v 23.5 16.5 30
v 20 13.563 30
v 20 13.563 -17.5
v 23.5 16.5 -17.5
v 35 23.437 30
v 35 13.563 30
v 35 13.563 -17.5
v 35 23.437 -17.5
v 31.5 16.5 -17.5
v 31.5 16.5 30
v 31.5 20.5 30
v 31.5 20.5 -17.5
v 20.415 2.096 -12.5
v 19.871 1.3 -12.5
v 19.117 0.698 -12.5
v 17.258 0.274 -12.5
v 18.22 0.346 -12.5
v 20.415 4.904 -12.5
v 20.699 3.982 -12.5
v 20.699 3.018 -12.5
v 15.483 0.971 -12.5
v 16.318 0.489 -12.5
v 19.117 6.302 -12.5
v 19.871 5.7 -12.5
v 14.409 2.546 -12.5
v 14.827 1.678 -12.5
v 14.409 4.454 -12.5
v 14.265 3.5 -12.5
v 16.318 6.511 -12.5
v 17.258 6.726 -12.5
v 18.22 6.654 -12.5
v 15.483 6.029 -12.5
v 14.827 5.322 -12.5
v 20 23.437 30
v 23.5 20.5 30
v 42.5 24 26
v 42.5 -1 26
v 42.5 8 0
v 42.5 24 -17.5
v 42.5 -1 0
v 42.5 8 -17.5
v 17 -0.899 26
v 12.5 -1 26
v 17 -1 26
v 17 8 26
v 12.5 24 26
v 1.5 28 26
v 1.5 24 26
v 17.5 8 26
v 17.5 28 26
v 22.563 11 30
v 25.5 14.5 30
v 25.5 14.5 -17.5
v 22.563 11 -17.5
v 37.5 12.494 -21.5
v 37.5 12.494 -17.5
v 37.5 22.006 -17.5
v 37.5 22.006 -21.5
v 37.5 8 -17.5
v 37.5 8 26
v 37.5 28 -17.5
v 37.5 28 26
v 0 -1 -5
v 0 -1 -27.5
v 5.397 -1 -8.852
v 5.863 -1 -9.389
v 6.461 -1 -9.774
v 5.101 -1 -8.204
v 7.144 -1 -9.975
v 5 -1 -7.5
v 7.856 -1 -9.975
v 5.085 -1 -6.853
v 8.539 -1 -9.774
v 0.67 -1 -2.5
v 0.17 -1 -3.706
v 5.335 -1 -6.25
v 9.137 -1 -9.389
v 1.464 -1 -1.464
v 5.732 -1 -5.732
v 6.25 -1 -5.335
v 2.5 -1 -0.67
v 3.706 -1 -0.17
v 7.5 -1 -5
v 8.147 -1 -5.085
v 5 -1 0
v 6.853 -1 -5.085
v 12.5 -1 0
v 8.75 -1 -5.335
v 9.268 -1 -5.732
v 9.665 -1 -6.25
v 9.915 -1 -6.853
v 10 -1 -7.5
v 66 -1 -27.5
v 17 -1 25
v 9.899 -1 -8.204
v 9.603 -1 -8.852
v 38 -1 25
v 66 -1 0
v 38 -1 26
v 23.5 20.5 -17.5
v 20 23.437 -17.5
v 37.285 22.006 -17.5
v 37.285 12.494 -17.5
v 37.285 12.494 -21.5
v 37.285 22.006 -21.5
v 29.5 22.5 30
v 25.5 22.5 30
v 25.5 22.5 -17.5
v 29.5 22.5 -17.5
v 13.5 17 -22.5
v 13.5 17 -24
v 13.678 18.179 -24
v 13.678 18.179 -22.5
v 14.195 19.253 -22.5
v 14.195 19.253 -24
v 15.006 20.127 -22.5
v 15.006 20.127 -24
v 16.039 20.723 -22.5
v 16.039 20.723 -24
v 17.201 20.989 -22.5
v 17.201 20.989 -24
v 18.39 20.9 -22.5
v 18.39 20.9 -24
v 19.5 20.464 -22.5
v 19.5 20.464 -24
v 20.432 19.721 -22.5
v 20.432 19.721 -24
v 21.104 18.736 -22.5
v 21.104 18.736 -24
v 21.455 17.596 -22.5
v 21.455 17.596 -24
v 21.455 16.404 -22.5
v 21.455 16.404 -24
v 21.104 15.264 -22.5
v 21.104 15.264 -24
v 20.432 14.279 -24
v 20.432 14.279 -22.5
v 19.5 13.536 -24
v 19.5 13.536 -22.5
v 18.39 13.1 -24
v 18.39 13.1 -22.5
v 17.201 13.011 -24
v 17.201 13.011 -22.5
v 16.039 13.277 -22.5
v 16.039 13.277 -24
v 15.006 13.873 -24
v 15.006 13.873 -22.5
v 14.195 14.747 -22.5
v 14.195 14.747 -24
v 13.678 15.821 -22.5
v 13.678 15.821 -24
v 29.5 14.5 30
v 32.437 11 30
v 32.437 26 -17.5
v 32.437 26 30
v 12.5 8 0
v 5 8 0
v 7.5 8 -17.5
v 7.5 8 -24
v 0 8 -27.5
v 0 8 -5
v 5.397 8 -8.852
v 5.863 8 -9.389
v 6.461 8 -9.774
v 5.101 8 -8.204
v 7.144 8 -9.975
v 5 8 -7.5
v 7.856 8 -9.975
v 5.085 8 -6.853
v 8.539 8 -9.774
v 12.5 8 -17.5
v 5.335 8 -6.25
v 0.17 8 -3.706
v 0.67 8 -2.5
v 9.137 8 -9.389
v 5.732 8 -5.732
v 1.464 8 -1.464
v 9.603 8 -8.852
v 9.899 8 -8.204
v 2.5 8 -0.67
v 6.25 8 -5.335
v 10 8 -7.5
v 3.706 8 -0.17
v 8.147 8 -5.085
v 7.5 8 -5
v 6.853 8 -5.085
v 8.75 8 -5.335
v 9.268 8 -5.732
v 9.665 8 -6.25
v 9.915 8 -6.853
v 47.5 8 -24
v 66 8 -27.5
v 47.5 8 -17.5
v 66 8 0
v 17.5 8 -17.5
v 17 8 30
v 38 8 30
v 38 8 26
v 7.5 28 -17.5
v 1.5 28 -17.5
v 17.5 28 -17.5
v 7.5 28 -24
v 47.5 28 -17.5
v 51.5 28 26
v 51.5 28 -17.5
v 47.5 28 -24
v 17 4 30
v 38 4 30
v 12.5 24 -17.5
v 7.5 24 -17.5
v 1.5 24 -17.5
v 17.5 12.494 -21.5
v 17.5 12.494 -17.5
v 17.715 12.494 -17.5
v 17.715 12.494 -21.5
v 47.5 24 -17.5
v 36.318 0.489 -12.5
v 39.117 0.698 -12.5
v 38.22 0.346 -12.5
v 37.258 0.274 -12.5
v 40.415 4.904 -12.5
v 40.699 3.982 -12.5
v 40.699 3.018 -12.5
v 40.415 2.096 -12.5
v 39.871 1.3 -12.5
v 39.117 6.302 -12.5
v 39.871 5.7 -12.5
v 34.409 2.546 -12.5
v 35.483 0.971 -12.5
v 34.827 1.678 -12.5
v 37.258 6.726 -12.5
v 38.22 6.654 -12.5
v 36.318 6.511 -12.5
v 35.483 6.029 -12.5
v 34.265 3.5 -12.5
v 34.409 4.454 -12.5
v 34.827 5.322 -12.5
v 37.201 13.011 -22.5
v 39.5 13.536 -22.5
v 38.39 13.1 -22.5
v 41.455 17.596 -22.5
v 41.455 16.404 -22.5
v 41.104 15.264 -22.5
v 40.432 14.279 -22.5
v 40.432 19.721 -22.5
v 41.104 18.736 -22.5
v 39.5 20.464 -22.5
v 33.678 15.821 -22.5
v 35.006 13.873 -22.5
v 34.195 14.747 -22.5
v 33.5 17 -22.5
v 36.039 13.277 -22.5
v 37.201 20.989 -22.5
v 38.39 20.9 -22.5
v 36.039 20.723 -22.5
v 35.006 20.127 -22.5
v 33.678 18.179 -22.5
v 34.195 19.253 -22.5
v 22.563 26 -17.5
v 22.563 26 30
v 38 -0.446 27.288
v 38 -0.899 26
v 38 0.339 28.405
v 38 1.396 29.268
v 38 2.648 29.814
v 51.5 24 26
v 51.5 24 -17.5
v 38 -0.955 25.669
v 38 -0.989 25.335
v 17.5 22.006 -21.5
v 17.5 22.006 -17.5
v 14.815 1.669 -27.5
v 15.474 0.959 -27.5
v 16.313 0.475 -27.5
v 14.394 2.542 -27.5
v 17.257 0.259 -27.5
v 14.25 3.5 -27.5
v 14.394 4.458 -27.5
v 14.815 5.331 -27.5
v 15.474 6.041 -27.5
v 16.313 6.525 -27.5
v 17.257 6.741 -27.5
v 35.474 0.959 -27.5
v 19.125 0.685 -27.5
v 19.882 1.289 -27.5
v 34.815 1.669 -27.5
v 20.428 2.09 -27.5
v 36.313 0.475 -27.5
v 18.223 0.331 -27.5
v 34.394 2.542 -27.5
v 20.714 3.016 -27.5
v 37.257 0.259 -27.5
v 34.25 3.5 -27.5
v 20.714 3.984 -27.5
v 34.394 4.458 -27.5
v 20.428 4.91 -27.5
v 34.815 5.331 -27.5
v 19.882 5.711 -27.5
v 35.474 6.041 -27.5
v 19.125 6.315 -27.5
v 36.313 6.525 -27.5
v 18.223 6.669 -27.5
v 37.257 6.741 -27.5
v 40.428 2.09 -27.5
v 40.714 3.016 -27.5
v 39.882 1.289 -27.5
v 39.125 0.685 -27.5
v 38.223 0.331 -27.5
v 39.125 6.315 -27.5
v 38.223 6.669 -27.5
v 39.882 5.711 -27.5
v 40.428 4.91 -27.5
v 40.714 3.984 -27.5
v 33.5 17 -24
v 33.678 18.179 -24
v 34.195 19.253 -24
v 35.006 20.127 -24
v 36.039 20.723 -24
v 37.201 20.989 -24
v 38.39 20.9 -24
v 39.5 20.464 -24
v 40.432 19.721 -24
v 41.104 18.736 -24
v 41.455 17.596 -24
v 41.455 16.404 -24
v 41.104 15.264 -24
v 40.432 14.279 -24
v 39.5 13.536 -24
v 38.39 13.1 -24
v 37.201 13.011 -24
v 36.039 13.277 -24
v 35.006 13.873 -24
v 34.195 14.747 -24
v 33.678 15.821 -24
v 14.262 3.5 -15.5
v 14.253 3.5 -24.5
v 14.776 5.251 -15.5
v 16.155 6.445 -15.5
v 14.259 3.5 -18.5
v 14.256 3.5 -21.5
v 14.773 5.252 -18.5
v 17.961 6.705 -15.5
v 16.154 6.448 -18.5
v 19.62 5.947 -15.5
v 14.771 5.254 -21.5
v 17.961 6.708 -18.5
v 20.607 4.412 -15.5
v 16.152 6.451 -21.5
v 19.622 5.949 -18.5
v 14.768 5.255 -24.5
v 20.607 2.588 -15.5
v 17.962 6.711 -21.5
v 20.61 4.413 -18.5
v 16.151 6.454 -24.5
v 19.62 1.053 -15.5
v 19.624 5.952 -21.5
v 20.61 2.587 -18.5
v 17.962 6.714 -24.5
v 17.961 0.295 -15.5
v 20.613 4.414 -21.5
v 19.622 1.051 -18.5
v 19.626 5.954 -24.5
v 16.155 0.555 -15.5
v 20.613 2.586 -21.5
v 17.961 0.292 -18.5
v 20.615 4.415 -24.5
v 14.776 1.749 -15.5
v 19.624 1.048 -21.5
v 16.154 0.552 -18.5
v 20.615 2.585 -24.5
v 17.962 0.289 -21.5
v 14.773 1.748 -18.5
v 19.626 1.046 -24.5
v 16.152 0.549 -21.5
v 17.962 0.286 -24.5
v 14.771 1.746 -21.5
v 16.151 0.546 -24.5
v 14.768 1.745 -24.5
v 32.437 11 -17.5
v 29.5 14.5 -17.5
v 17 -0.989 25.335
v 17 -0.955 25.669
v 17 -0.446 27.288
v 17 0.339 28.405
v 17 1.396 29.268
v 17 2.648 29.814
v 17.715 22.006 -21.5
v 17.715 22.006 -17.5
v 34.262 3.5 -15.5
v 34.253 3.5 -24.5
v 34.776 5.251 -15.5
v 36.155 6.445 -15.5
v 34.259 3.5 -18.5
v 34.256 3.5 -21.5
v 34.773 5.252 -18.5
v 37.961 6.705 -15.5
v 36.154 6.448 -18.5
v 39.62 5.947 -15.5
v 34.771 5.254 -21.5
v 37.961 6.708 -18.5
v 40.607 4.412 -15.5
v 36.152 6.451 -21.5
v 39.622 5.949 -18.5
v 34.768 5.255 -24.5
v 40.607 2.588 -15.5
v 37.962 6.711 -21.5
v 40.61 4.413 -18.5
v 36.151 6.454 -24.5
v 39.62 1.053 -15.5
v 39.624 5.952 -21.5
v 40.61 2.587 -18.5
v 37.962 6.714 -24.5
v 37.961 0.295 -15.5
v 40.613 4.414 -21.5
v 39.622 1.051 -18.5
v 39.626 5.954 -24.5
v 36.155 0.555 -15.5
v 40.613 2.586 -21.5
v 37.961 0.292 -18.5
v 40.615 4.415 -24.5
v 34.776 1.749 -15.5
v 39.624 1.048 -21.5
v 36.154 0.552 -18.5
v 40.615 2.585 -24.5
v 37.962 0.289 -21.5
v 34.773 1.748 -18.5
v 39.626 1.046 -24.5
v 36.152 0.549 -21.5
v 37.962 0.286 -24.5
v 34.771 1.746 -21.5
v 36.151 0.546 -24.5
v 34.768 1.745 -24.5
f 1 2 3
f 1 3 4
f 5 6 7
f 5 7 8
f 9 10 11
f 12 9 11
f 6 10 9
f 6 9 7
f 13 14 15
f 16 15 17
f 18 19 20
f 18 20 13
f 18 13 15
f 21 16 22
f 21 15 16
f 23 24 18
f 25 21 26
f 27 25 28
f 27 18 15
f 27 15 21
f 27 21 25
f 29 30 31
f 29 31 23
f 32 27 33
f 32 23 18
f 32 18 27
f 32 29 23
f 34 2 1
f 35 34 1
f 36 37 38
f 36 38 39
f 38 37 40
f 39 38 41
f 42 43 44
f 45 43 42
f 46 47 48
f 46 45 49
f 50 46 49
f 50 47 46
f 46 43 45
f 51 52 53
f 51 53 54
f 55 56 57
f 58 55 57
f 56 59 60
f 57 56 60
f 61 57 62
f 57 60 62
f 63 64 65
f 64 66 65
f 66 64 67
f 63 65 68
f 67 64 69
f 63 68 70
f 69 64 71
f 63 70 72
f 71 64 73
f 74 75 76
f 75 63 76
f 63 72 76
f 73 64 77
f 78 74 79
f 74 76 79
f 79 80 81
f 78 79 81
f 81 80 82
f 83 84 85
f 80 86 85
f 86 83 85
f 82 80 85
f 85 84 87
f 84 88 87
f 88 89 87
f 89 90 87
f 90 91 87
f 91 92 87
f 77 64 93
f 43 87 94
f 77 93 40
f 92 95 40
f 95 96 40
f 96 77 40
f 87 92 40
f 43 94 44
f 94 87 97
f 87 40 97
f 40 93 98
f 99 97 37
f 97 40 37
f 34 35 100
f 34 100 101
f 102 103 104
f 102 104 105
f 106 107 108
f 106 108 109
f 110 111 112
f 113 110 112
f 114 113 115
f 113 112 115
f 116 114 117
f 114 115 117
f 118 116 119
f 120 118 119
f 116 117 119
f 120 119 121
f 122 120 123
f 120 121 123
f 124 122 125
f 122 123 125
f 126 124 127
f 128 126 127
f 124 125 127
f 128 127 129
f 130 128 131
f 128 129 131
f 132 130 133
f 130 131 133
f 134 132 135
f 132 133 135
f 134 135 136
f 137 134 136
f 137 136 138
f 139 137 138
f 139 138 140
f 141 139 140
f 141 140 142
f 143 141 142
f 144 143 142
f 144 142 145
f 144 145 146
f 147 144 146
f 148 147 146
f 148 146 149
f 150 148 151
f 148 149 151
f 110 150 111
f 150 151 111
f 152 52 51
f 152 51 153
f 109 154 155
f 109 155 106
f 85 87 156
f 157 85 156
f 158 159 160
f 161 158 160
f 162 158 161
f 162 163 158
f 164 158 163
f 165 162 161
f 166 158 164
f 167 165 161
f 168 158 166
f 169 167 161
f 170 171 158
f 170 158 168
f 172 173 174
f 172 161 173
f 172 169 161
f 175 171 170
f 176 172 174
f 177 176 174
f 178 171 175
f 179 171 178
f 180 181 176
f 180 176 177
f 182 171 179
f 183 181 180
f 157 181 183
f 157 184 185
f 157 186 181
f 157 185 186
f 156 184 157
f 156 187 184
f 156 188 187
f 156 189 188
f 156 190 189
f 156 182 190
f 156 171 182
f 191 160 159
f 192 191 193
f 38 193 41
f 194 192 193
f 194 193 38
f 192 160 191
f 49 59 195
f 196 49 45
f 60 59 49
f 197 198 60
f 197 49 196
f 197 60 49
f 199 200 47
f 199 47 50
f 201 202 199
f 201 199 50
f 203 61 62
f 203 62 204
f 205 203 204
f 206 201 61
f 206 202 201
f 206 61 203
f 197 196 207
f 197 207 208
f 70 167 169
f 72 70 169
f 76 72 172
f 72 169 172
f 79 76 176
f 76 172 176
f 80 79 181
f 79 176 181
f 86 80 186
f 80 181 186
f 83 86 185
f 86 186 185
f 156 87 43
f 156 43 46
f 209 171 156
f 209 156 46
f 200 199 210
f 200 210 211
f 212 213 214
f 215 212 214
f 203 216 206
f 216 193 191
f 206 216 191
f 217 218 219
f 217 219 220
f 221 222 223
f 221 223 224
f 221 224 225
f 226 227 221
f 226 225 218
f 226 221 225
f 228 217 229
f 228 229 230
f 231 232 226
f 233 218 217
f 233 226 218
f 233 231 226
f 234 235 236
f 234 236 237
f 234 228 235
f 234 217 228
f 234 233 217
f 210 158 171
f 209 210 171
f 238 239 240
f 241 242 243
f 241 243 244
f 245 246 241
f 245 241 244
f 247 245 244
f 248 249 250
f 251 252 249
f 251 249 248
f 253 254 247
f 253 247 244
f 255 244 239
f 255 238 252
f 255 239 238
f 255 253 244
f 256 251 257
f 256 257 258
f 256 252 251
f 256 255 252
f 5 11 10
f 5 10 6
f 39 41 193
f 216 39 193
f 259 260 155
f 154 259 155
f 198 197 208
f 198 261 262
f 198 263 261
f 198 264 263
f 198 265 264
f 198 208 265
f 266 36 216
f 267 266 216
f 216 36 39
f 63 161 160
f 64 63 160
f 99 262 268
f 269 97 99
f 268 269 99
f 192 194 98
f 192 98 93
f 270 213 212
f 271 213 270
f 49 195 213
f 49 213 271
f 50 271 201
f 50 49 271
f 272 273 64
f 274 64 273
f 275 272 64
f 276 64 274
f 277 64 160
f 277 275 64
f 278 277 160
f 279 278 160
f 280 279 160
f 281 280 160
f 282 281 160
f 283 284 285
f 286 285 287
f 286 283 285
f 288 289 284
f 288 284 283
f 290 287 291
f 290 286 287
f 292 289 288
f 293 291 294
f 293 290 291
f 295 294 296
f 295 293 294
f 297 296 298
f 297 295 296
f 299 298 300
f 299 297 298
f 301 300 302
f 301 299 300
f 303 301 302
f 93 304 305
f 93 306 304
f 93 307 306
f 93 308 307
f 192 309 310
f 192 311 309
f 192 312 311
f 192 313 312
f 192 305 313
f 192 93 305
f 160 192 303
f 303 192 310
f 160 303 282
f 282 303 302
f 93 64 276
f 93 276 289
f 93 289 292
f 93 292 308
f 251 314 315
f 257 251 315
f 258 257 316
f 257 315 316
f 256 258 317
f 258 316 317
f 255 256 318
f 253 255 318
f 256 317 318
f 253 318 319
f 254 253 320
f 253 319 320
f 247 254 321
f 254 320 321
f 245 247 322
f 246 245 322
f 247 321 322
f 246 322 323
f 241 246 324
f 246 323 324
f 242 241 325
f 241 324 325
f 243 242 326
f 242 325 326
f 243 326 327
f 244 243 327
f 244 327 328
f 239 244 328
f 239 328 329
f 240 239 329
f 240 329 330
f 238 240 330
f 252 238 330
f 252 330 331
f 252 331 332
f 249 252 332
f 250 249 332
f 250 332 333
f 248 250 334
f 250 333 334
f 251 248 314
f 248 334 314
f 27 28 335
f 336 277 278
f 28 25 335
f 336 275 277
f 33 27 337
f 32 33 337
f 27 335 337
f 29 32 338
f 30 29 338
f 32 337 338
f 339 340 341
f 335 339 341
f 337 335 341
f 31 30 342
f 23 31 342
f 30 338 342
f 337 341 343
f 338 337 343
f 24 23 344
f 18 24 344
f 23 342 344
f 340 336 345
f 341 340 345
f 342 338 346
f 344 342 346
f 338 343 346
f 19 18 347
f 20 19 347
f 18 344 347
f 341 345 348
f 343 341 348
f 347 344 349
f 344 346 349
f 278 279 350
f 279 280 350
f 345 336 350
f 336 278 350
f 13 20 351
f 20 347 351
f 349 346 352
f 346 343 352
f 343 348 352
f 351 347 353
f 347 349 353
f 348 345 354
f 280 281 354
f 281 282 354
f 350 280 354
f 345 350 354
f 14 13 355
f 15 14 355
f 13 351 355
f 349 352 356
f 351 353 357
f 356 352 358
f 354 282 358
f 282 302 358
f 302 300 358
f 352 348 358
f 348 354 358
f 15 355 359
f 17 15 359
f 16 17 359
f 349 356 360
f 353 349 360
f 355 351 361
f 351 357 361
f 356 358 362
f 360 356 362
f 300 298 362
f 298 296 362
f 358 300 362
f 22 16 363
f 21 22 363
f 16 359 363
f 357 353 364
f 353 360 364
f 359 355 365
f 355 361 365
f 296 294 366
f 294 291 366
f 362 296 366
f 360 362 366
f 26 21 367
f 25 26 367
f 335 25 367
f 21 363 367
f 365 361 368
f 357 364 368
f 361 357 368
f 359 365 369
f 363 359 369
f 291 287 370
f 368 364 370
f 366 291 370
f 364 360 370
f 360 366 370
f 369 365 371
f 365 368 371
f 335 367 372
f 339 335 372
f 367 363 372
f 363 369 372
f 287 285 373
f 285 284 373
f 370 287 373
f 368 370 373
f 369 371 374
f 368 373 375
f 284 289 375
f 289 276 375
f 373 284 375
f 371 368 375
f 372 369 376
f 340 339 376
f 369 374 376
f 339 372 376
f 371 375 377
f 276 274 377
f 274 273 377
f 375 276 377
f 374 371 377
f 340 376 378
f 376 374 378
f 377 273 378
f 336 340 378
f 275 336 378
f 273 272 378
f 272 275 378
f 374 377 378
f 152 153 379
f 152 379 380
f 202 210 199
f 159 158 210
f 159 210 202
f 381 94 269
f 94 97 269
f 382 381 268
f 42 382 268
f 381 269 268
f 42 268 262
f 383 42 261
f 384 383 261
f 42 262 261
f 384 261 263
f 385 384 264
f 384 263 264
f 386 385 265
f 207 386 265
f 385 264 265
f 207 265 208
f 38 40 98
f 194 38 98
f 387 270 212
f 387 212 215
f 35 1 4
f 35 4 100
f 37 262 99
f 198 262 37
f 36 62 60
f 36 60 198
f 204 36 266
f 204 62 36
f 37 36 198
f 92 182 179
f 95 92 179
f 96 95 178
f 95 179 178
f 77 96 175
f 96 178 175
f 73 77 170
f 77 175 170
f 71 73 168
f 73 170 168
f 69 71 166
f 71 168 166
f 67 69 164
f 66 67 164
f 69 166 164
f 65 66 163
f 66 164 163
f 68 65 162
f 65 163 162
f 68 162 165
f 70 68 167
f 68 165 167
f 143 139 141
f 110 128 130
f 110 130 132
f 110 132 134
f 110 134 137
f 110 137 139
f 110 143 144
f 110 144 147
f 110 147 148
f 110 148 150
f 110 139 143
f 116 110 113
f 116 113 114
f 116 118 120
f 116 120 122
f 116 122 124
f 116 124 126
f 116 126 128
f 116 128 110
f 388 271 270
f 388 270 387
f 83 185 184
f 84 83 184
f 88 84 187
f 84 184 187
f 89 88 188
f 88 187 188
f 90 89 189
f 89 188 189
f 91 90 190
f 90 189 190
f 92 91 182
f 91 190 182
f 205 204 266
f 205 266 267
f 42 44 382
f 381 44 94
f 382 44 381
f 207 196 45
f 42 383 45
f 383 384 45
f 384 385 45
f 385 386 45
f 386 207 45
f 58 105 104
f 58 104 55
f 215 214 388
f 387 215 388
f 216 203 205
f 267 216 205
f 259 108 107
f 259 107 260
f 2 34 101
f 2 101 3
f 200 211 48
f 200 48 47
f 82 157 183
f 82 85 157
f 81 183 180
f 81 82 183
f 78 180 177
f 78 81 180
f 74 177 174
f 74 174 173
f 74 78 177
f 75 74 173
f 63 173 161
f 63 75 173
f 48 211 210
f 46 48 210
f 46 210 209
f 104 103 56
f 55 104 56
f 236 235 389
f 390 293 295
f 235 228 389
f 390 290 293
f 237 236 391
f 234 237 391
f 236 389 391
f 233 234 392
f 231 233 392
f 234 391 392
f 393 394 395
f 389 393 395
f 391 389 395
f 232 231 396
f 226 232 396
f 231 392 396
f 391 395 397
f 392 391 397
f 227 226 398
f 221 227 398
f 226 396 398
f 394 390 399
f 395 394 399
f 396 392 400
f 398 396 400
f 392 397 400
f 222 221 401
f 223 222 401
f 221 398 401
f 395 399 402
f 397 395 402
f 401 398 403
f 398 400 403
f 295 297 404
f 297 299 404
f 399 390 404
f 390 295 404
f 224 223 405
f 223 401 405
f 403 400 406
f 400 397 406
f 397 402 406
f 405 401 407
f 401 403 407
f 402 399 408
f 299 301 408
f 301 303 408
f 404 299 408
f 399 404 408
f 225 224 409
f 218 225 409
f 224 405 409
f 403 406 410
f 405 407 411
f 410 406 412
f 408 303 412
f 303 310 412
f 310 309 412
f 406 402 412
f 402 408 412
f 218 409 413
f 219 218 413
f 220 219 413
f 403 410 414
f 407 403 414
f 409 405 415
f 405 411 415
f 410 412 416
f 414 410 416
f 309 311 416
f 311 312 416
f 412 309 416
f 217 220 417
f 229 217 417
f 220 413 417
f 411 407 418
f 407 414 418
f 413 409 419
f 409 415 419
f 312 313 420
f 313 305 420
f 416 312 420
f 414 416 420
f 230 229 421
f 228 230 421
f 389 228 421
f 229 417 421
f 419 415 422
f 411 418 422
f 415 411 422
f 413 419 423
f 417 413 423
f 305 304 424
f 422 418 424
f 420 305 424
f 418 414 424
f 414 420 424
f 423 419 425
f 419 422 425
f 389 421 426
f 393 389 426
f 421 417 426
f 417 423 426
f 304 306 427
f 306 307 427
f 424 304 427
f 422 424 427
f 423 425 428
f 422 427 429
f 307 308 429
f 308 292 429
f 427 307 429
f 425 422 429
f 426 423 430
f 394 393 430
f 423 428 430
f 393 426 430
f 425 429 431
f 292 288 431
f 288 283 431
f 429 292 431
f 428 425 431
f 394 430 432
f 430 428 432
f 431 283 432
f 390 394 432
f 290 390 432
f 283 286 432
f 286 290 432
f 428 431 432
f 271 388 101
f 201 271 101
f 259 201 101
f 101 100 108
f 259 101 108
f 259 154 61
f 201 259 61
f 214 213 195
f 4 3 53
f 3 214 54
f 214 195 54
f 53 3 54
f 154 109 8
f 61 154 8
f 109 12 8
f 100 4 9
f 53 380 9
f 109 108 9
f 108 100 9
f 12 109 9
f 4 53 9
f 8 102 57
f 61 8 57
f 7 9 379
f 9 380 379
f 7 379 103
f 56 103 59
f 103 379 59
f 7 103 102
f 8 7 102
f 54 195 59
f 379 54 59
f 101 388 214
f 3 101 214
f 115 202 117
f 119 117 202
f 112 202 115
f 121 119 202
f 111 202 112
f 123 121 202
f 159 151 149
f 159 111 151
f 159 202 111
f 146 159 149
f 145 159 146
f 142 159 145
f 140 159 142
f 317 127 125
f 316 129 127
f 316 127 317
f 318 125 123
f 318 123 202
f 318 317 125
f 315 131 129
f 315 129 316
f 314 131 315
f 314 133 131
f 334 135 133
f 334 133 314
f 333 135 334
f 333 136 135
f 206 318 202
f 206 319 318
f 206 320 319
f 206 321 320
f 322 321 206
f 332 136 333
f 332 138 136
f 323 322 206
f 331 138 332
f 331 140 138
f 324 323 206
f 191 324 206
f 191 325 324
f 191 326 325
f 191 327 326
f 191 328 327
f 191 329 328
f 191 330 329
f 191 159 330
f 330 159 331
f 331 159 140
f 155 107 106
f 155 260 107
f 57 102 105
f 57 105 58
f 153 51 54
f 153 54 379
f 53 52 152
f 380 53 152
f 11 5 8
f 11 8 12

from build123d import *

# Parameters (mm, degrees)
BOSS_EXTRUDE2_DEPTH          = 8
BOSS_EXTRUDE2_DEPTH_BACK     = 1
SKETCH1_R                    = 2.5
CUT_EXTRUDE1_DEPTH           = 79.300702423
CUT_EXTRUDE1_DEPTH_BACK      = 79.300702423
SKETCH2_R                    = 2.5
SKETCH3_R                    = 3.25
CUT_EXTRUDE5_DEPTH           = 15
CUT_EXTRUDE5_DRAFT           = -0.0573
CUT_EXTRUDE5_PROFILE_2_DEPTH = 15
CUT_EXTRUDE5_PROFILE_2_DRAFT = -0.0573
SKETCH5_W                    = 4.5
SKETCH5_H                    = 6.5
BOSS_EXTRUDE3_DEPTH          = 14.5
SKETCH6_R                    = 4
CUT_EXTRUDE4_DEPTH           = 1.5
SKETCH12_W                   = 10.5
SKETCH12_H                   = 30
BOSS_EXTRUDE7_DEPTH          = 9
SKETCH15_W                   = 9
SKETCH15_H                   = 6.5
BOSS_EXTRUDE8_DEPTH          = 3.5
BOSS_EXTRUDE9_DEPTH          = 54
FILLET4_R                    = 5
SKETCH18_W                   = 9.873697418
SKETCH18_H                   = 6.5
BOSS_EXTRUDE11_DEPTH         = 0.5
SKETCH20_W                   = 4
SKETCH20_H                   = 17.5
BOSS_EXTRUDE12_DEPTH         = 18
BOSS_EXTRUDE13_DEPTH         = 11
BOSS_EXTRUDE13_DEPTH_BACK    = 4
SKETCH22_W                   = 17.5
SKETCH22_H                   = 4
SKETCH25_W                   = 2
SKETCH25_H                   = 17.5
BOSS_EXTRUDE14_DEPTH         = 41
SKETCH28_W                   = 41
SKETCH28_H                   = 45
BOSS_EXTRUDE15_DEPTH         = 2
SKETCH29_R                   = 1.75
CUT_EXTRUDE8_DEPTH           = 9
BOSS_EXTRUDE16_DEPTH         = 9
BOSS_EXTRUDE16_DEPTH_BACK    = 4
SKETCH30_W                   = 17.5
SKETCH30_H                   = 2
CUT_EXTRUDE9_DEPTH           = 9
SKETCH32_W                   = 13
SKETCH32_H                   = 4
BOSS_EXTRUDE17_DEPTH         = 23.5
SKETCH33_W                   = 0.5
SKETCH33_H                   = 17.5
BOSS_EXTRUDE18_DEPTH         = 20
SKETCH34_W                   = 4.5
SKETCH34_H                   = 25
SKETCH34_W_2                 = 15.5
SKETCH34_H_2                 = 4
SKETCH34_W_3                 = 9
BOSS_EXTRUDE19_DEPTH         = 26
SKETCH35_W                   = 9.873697418
SKETCH35_H                   = 0.5
BOSS_EXTRUDE20_DEPTH         = 47.5
BOSS_EXTRUDE21_DEPTH         = 47.5
SKETCH38_W                   = 0.419549816
SKETCH38_H                   = 18.5
CUT_EXTRUDE10_DEPTH          = 90.5
SKETCH39_W                   = 4
SKETCH39_H                   = 4
BOSS_EXTRUDE23_DEPTH         = 47.5
SKETCH46_W                   = 22.5
SKETCH46_H                   = 9
SKETCH46_W_2                 = 5
BOSS_EXTRUDE26_DEPTH         = 11.5
SKETCH47_W                   = 27.5
SKETCH47_H                   = 9
BOSS_EXTRUDE27_DEPTH         = 11
SKETCH48_W                   = 5
SKETCH48_H                   = 6.5
BOSS_EXTRUDE31_DEPTH         = 18.5
SKETCH50_R                   = 4
CUT_EXTRUDE11_DEPTH          = 1.5
SKETCH51_W                   = 9.626242636
SKETCH51_H                   = 9.125298808
BOSS_EXTRUDE32_DEPTH         = 1.5
BOSS_EXTRUDE35_DEPTH         = 47.5
SKETCH55_W                   = 9.873697418
SKETCH55_H                   = 0.5
CUT_EXTRUDE12_DEPTH          = 47.5
SKETCH56_W                   = 0.5
SKETCH56_H                   = 20
BOSS_EXTRUDE36_DEPTH         = 43.5
BOSS_EXTRUDE37_DEPTH         = 47.5
SKETCH58_W                   = 0.715052156
SKETCH58_H                   = 9.51279705
CUT_EXTRUDE13_DEPTH          = 4
CUT_EXTRUDE15_DEPTH          = 47.5
SKETCH60_W                   = 0.215052156
SKETCH60_H                   = 9.51279705
CUT_EXTRUDE16_DEPTH          = 47.5
CUT_EXTRUDE17_DEPTH          = 47.5
SKETCH62_W                   = 8
SKETCH62_H                   = 8
CUT_EXTRUDE18_DEPTH          = 47.5
SKETCH63_W                   = 13
SKETCH63_H                   = 4
CUT_EXTRUDE20_DEPTH          = 17
SKETCH64_W                   = 1
SKETCH64_H                   = 1.5
BOSS_EXTRUDE38_DEPTH         = 6.5
CUT_EXTRUDE22_DEPTH          = 9
FILLET6_R                    = 5
BOSS_EXTRUDE39_DEPTH         = 11
BOSS_EXTRUDE39_DEPTH_BACK    = 10
SKETCH67_W                   = 27.5
SKETCH67_H                   = 9
SKETCH68_W                   = 2
SKETCH68_H                   = 45
CUT_EXTRUDE23_DEPTH          = 17
SKETCH69_W                   = 2
SKETCH69_H                   = 41
CUT_EXTRUDE24_DEPTH          = 37
SKETCH70_W                   = 6
SKETCH70_H                   = 2.5
CUT_EXTRUDE25_DEPTH          = 6.5
SKETCH71_W                   = 40
SKETCH71_H                   = 6.5
BOSS_EXTRUDE40_DEPTH         = 1.5


with BuildPart() as part:
    # Sketch1 → Boss-Extrude2 (new, two sides: drawn at the far end of the back side and taken through both)
    with BuildSketch(Plane(origin=(0, 0, 0), x_dir=(1, 0, 0), z_dir=(0, 1, 0)).offset(-BOSS_EXTRUDE2_DEPTH_BACK)):
        with BuildLine():
            Line((5, 0), (50, 0))
            ThreePointArc((50, 0), (53.535533906, 1.464466094), (55, 5))
            Line((55, 5), (55, 50))
            ThreePointArc((55, 50), (53.535533906, 53.535533906), (50, 55))
            Line((50, 55), (5, 55))
            ThreePointArc((5, 55), (1.464466094, 53.535533906), (0, 50))
            Line((0, 50), (0, 5))
            ThreePointArc((0, 5), (1.464466094, 1.464466094), (5, 0))
        make_face()
        with Locations(Location((7.5, 47.5, 0), (0, 0, 270))):
            Circle(SKETCH1_R, mode=Mode.SUBTRACT)
        with Locations(Location((47.5, 47.5, 0), (0, 0, 270))):
            Circle(SKETCH1_R, mode=Mode.SUBTRACT)
        with Locations(Location((47.5, 7.5, 0), (0, 0, 270))):
            Circle(SKETCH1_R, mode=Mode.SUBTRACT)
        with Locations(Location((7.5, 7.5, 0), (0, 0, 270))):
            Circle(SKETCH1_R, mode=Mode.SUBTRACT)
    extrude(amount=BOSS_EXTRUDE2_DEPTH + BOSS_EXTRUDE2_DEPTH_BACK)

    # Sketch2 → Cut-Extrude1 (cut, two sides: drawn at the far end of the back side and taken through both)
    with BuildSketch(Plane(origin=(0, 8, 0), x_dir=(1, 0, 0), z_dir=(0, 1, 0)).offset(-CUT_EXTRUDE1_DEPTH_BACK)):
        with BuildLine():
            Line((0, 50), (0, 27.5))
            Line((0, 27.5), (55, 27.5))
            Line((55, 27.5), (55, 50))
            ThreePointArc((55, 50), (53.535533906, 53.535533906), (50, 55))
            Line((50, 55), (5, 55))
            ThreePointArc((5, 55), (1.464466094, 53.535533906), (0, 50))
        make_face()
        with Locations((7.5, 47.5)):
            Circle(SKETCH2_R, mode=Mode.SUBTRACT)
        with Locations((47.5, 47.5)):
            Circle(SKETCH2_R, mode=Mode.SUBTRACT)
    extrude(amount=CUT_EXTRUDE1_DEPTH + CUT_EXTRUDE1_DEPTH_BACK, mode=Mode.SUBTRACT)


with BuildPart() as cut_extrude5_tool:
    # Sketch3 → Cut-Extrude5 (with draft: the straight prism first)
    with BuildSketch(Plane(origin=(0, 0, -27.5), x_dir=(-1, 0, 0), z_dir=(0, 0, -1))):
        with Locations((-37.5, 3.5)):
            Circle(SKETCH3_R)
    extrude(amount=-CUT_EXTRUDE5_DEPTH)
    # Cut-Extrude5: the draft: its side faces are tilted about the plane it starts from
    cut_extrude5_sides = [cut_extrude5_tool.faces().sort_by_distance(p)[0] for p in [
        (40.75, 3.5, -20),
    ]]
    draft(cut_extrude5_sides, Plane(origin=(0, 0, -27.5), x_dir=(-1, 0, 0), z_dir=(0, 0, -1)), CUT_EXTRUDE5_DRAFT)


with BuildPart() as part_1:
    add(part.part)

    # Cut-Extrude5: cut by cut_extrude5_tool
    add(cut_extrude5_tool.part, mode=Mode.SUBTRACT)


with BuildPart() as cut_extrude5_profile_2_tool:
    # Sketch3 → Cut-Extrude5 profile 2 (with draft: the straight prism first)
    with BuildSketch(Plane(origin=(0, 0, -27.5), x_dir=(-1, 0, 0), z_dir=(0, 0, -1))):
        with Locations((-17.5, 3.5)):
            Circle(SKETCH3_R)
    extrude(amount=-CUT_EXTRUDE5_PROFILE_2_DEPTH)
    # Cut-Extrude5 profile 2: the draft: its side faces are tilted about the plane it starts from
    cut_extrude5_profile_2_sides = [cut_extrude5_profile_2_tool.faces().sort_by_distance(p)[0] for p in [
        (20.75, 3.5, -20),
    ]]
    draft(cut_extrude5_profile_2_sides, Plane(origin=(0, 0, -27.5), x_dir=(-1, 0, 0), z_dir=(0, 0, -1)), CUT_EXTRUDE5_PROFILE_2_DRAFT)


with BuildPart() as part_2:
    add(part_1.part)

    # Cut-Extrude5 profile 2: cut by cut_extrude5_profile_2_tool
    add(cut_extrude5_profile_2_tool.part, mode=Mode.SUBTRACT)

    # Sketch5 → Boss-Extrude3 (add)
    with BuildSketch(Plane(origin=(0, 8, 0), x_dir=(1, 0, 0), z_dir=(0, 1, 0))):
        with Locations((25.25, 20.75)):
            Rectangle(SKETCH5_W, SKETCH5_H)
        with Locations((29.75, 20.75)):
            Rectangle(SKETCH5_W, SKETCH5_H)
    extrude(amount=BOSS_EXTRUDE3_DEPTH)

    # Sketch6 → Cut-Extrude4 (cut)
    with BuildSketch(Plane(origin=(0, 0, -24), x_dir=(-1, 0, 0), z_dir=(0, 0, -1))):
        with Locations((-27.5, 17)):
            Circle(SKETCH6_R)
    extrude(amount=-CUT_EXTRUDE4_DEPTH, mode=Mode.SUBTRACT)

    # Sketch12 → Boss-Extrude7 (add)
    with BuildSketch(Plane(origin=(0, 8, 0), x_dir=(1, 0, 0), z_dir=(0, 1, 0))):
        with Locations((32.75, -15)):
            Rectangle(SKETCH12_W, SKETCH12_H)
        with Locations((22.25, -15)):
            Rectangle(SKETCH12_W, SKETCH12_H)
    extrude(amount=-BOSS_EXTRUDE7_DEPTH)

    # Sketch15 → Boss-Extrude8 (add)
    with BuildSketch(Plane(origin=(0, 22.5, 0), x_dir=(1, 0, 0), z_dir=(0, 1, 0))):
        with Locations((27.5, 20.75)):
            Rectangle(SKETCH15_W, SKETCH15_H)
    extrude(amount=BOSS_EXTRUDE8_DEPTH)

    # Sketch11 → Boss-Extrude9 (add)
    with BuildSketch(Plane(origin=(0, 0, -24), x_dir=(-1, 0, 0), z_dir=(0, 0, -1))):
        Polygon((-32.436848709, 26), (-29.5, 22.5), (-29.5, 26), align=None)
        Polygon((-29.5, 22.5), (-27.5, 22.5), (-25.5, 22.5), (-25.5, 26), (-29.5, 26), align=None)
        Polygon((-25.5, 26), (-25.5, 22.5), (-22.563151291, 26), align=None)
    extrude(amount=-BOSS_EXTRUDE9_DEPTH)

    # Fillet4
    fillet4_edges = [part_2.edges().sort_by_distance(p)[0] for p in [
        (27.5, -1, 30),
    ]]
    fillet(fillet4_edges, radius=FILLET4_R)

    # Sketch18 → Boss-Extrude11 (add)
    with BuildSketch(Plane(origin=(0, 26, 0), x_dir=(1, 0, 0), z_dir=(0, 1, 0))):
        with Locations((27.5, 20.75)):
            Rectangle(SKETCH18_W, SKETCH18_H)
    extrude(amount=BOSS_EXTRUDE11_DEPTH)

    # Sketch20 → Boss-Extrude12 (add)
    with BuildSketch(Plane(origin=(0, 8, 0), x_dir=(1, 0, 0), z_dir=(0, 1, 0))):
        with Locations((14.5, 8.75)):
            Rectangle(SKETCH20_W, SKETCH20_H)
        with Locations((40.5, 8.75)):
            Rectangle(SKETCH20_W, SKETCH20_H)
    extrude(amount=BOSS_EXTRUDE12_DEPTH)

    # Sketch22 → Boss-Extrude13 (add, two sides: drawn at the far end of the back side and taken through both)
    with BuildSketch(Plane.ZY.offset(-12.5).offset(-BOSS_EXTRUDE13_DEPTH_BACK)):
        with Locations((-8.75, 26)):
            Rectangle(SKETCH22_W, SKETCH22_H)
    extrude(amount=BOSS_EXTRUDE13_DEPTH + BOSS_EXTRUDE13_DEPTH_BACK)

    # Sketch25 → Boss-Extrude14 (add)
    with BuildSketch(Plane(origin=(0, 28, 0), x_dir=(1, 0, 0), z_dir=(0, 1, 0))):
        with Locations((2.5, 8.75)):
            Rectangle(SKETCH25_W, SKETCH25_H)
    extrude(amount=BOSS_EXTRUDE14_DEPTH)

    # Sketch28 → Boss-Extrude15 (add)
    with BuildSketch(Plane.ZY.offset(-1.5)):
        with Locations((-20.5, 46.5)):
            Rectangle(SKETCH28_W, SKETCH28_H)
    extrude(amount=-BOSS_EXTRUDE15_DEPTH)

    # Sketch29 → Cut-Extrude8 (cut)
    with BuildSketch(Plane.ZY.offset(-1.5)):
        with Locations((-36, 33)):
            Circle(SKETCH29_R)
        with Locations((-5, 64)):
            Circle(SKETCH29_R)
        with Locations((-5, 33)):
            Circle(SKETCH29_R)
        with Locations((-36, 64)):
            Circle(SKETCH29_R)
    extrude(amount=-CUT_EXTRUDE8_DEPTH, mode=Mode.SUBTRACT)

    # Sketch30 → Boss-Extrude16 (add, two sides: drawn at the far end of the back side and taken through both)
    with BuildSketch(Plane(origin=(42.5, 0, 0), x_dir=(0, 0, -1), z_dir=(1, 0, 0)).offset(-BOSS_EXTRUDE16_DEPTH_BACK)):
        with Locations((8.75, 25)):
            Rectangle(SKETCH30_W, SKETCH30_H)
        with Locations((8.75, 27)):
            Rectangle(SKETCH30_W, SKETCH30_H)
    extrude(amount=BOSS_EXTRUDE16_DEPTH + BOSS_EXTRUDE16_DEPTH_BACK)

    # Sketch31 → Cut-Extrude9 (cut)
    with BuildSketch(Plane(origin=(3.5, 0, 0), x_dir=(0, 0, -1), z_dir=(1, 0, 0))):
        with BuildLine():
            ThreePointArc((30.5, 47), (27.571067812, 54.071067812), (20.5, 57))
            Line((20.5, 57), (20.5, 47))
            Line((20.5, 47), (30.5, 47))
        make_face()
        with BuildLine():
            Line((20.5, 47), (20.5, 57))
            ThreePointArc((20.5, 57), (13.428932188, 39.928932188), (30.5, 47))
            Line((30.5, 47), (20.5, 47))
        make_face()
    extrude(amount=-CUT_EXTRUDE9_DEPTH, mode=Mode.SUBTRACT)

    # Sketch32 → Boss-Extrude17 (add)
    with BuildSketch(Plane(origin=(0, 0, -17.5), x_dir=(-1, 0, 0), z_dir=(0, 0, -1))):
        with Locations((-10, 26)):
            Rectangle(SKETCH32_W, SKETCH32_H)
    extrude(amount=BOSS_EXTRUDE17_DEPTH)

    # Sketch33 → Boss-Extrude18 (add)
    with BuildSketch(Plane(origin=(0, 8, 0), x_dir=(1, 0, 0), z_dir=(0, 1, 0))):
        with Locations((38.25, 8.75)):
            Rectangle(SKETCH33_W, SKETCH33_H)
        with Locations((16.75, 8.75)):
            Rectangle(SKETCH33_W, SKETCH33_H)
    extrude(amount=BOSS_EXTRUDE18_DEPTH)

    # Sketch34 → Boss-Extrude19 (add)
    with BuildSketch(Plane.XY):
        with Locations((14.75, 11.5)):
            Rectangle(SKETCH34_W, SKETCH34_H)
        with Locations((9.25, 26)):
            Rectangle(SKETCH34_W_2, SKETCH34_H_2)
        Polygon((42.5, 24), (42.5, 28), (38, 28), (38, 8), (38, -1), (42.5, -1), (42.5, 8), align=None)
        with Locations((47, 26)):
            Rectangle(SKETCH34_W_3, SKETCH34_H_2)
    extrude(amount=BOSS_EXTRUDE19_DEPTH)

    # Sketch35 → Boss-Extrude20 (add)
    with BuildSketch(Plane.XY.offset(-17.5)):
        with Locations((27.5, 26.25)):
            Rectangle(SKETCH35_W, SKETCH35_H)
    extrude(amount=BOSS_EXTRUDE20_DEPTH)

    # Sketch37 → Boss-Extrude21 (add)
    with BuildSketch(Plane.XY.offset(-17.5)):
        Polygon((23, 8), (25.5, 8), (25.5, 12), (23, 9.020616019), align=None)
        Polygon((25.5, 8), (27.5, 8), (29.5, 8), (29.5, 12), (25.5, 12), align=None)
        Polygon((29.5, 12), (29.5, 8), (32, 8), (32, 9.020616019), align=None)
        Polygon((29.5, 8), (27.5, 8), (25.5, 8), (23, 8), (23, 9.020616019), (21.863844179, 7.666598237), (33.136155821, 7.666598237), (32, 9.020616019), (32, 8), align=None)
    extrude(amount=BOSS_EXTRUDE21_DEPTH)

    # Sketch38 → Cut-Extrude10 (cut)
    with BuildSketch(Plane.XY.offset(30)):
        with Locations((22.353376383, 17.25)):
            Rectangle(SKETCH38_W, SKETCH38_H)
        with Locations((32.646623617, 17.25)):
            Rectangle(SKETCH38_W, SKETCH38_H)
    extrude(amount=-CUT_EXTRUDE10_DEPTH, mode=Mode.SUBTRACT)

    # Sketch39 → Boss-Extrude23 (add)
    with BuildSketch(Plane.XY.offset(30)):
        Polygon((21, 19.25), (17.715052156, 22.006398525), (17, 22.006398525), (17, 19.25), align=None)
        with Locations((19, 17.25)):
            Rectangle(SKETCH39_W, SKETCH39_H)
        Polygon((17.715052156, 12.493601475), (21, 15.25), (17, 15.25), (17, 12.493601475), align=None)
        Polygon((37.284947844, 12.493601475), (38, 12.493601475), (38, 15.25), (34, 15.25), align=None)
        Polygon((38, 17.25), (38, 19.25), (34, 19.25), (34, 15.25), (38, 15.25), align=None)
        Polygon((38, 19.25), (38, 22.006398525), (37.284947844, 22.006398525), (34, 19.25), align=None)
    extrude(amount=-BOSS_EXTRUDE23_DEPTH)

    # Sketch46 → Boss-Extrude26 (add)
    with BuildSketch(Plane.ZY):
        with Locations((-16.25, 3.5)):
            Rectangle(SKETCH46_W, SKETCH46_H)
        with Locations((-2.5, 3.5)):
            Rectangle(SKETCH46_W_2, SKETCH46_H)
    extrude(amount=-BOSS_EXTRUDE26_DEPTH)

    # Sketch47 → Boss-Extrude27 (add)
    with BuildSketch(Plane.ZY):
        with Locations((-13.75, 3.5)):
            Rectangle(SKETCH47_W, SKETCH47_H)
    extrude(amount=BOSS_EXTRUDE27_DEPTH)

    # Sketch48 → Boss-Extrude31 (add)
    with BuildSketch(Plane(origin=(0, 8, 0), x_dir=(1, 0, 0), z_dir=(0, 1, 0))):
        Polygon((42.5, 17.5), (42.5, 24), (32, 24), (32, 17.5), (32.436848709, 17.5), (38, 17.5), align=None)
        with Locations((45, 20.75)):
            Rectangle(SKETCH48_W, SKETCH48_H)
        Polygon((12.5, 24), (12.5, 17.5), (17, 17.5), (22.563151291, 17.5), (23, 17.5), (23, 24), align=None)
        with Locations((10, 20.75)):
            Rectangle(SKETCH48_W, SKETCH48_H)
    extrude(amount=BOSS_EXTRUDE31_DEPTH)

    # Sketch50 → Cut-Extrude11 (cut)
    with BuildSketch(Plane(origin=(0, 0, -24), x_dir=(-1, 0, 0), z_dir=(0, 0, -1))):
        with Locations((-17.5, 17)):
            Circle(SKETCH50_R)
        with Locations((-37.5, 17)):
            Circle(SKETCH50_R)
    extrude(amount=-CUT_EXTRUDE11_DEPTH, mode=Mode.SUBTRACT)

    # Sketch51 → Boss-Extrude32 (add)
    with BuildSketch(Plane(origin=(0, 0, -24), x_dir=(-1, 0, 0), z_dir=(0, 0, -1))):
        with Locations((-27.646184708, 17.114099589)):
            Rectangle(SKETCH51_W, SKETCH51_H)
    extrude(amount=-BOSS_EXTRUDE32_DEPTH)

    # Sketch54 → Boss-Extrude35 (add)
    with BuildSketch(Plane.XY.offset(-17.5)):
        Polygon((29.5, 22.5), (27.5, 22.5), (27.5, 14.5), (31.5, 14.5), (31.5, 22.5), align=None)
        Polygon((27.5, 14.5), (27.5, 22.5), (25.5, 22.5), (23.5, 22.5), (23.5, 14.5), align=None)
    extrude(amount=BOSS_EXTRUDE35_DEPTH)

    # Sketch55 → Cut-Extrude12 (cut)
    with BuildSketch(Plane.XY.offset(30)):
        with Locations((27.5, 26.25)):
            Rectangle(SKETCH55_W, SKETCH55_H)
    extrude(amount=-CUT_EXTRUDE12_DEPTH, mode=Mode.SUBTRACT)

    # Sketch56 → Boss-Extrude36 (add)
    with BuildSketch(Plane.XY.offset(26)):
        with Locations((37.75, 18)):
            Rectangle(SKETCH56_W, SKETCH56_H)
        with Locations((17.25, 18)):
            Rectangle(SKETCH56_W, SKETCH56_H)
    extrude(amount=-BOSS_EXTRUDE36_DEPTH)

    # Sketch57 → Boss-Extrude37 (add)
    with BuildSketch(Plane.XY.offset(30)):
        Polygon((35, 23.436848709), (31.5, 20.5), (31.5, 20.428787517), (35, 20.428787517), align=None)
        Polygon((35, 20.428787517), (31.5, 20.428787517), (31.5, 18.5), (35, 18.5), (35, 18.535606241), align=None)
        Polygon((35, 18.5), (31.5, 18.5), (31.5, 16.5), (35, 16.5), (35, 18.464393759), align=None)
        Polygon((35, 16.5), (31.5, 16.5), (35, 13.563151291), align=None)
        Polygon((32.436848709, 11), (29.5, 14.5), (25.5, 14.5), (22.563151291, 11), align=None)
        Polygon((20, 16.5), (23.5, 16.5), (23.5, 18.5), (23.5, 20.5), (20, 23.436848709), (20, 18.535606241), (20, 18.464393759), align=None)
        Polygon((20, 13.563151291), (23.5, 16.5), (20, 16.5), align=None)
    extrude(amount=-BOSS_EXTRUDE37_DEPTH)

    # Sketch58 → Cut-Extrude13 (cut)
    with BuildSketch(Plane.XY.offset(30)):
        with Locations((37.642473922, 17.25)):
            Rectangle(SKETCH58_W, SKETCH58_H)
        with Locations((17.357526078, 17.25)):
            Rectangle(SKETCH58_W, SKETCH58_H)
    extrude(amount=-CUT_EXTRUDE13_DEPTH, mode=Mode.SUBTRACT)

    # Sketch59 → Cut-Extrude15 (cut)
    with BuildSketch(Plane.XY.offset(30)):
        Polygon((37.284947844, 22.006398525), (35, 20.089099631), (35, 14.410900369), (37.284947844, 12.493601475), align=None)
        Polygon((17.715052156, 22.006398525), (20, 20.089099631), (20, 14.410900369), (17.715052156, 12.493601475), align=None)
    extrude(amount=-CUT_EXTRUDE15_DEPTH, mode=Mode.SUBTRACT)

    # Sketch60 → Cut-Extrude16 (cut)
    with BuildSketch(Plane.XY.offset(26)):
        with Locations((37.392473922, 17.25)):
            Rectangle(SKETCH60_W, SKETCH60_H)
        with Locations((17.607526078, 17.25)):
            Rectangle(SKETCH60_W, SKETCH60_H)
    extrude(amount=-CUT_EXTRUDE16_DEPTH, mode=Mode.SUBTRACT)

    # Sketch61 → Cut-Extrude17 (cut)
    with BuildSketch(Plane.XY.offset(30)):
        Polygon((32.436848709, 8), (22.563151291, 8), (22.563151291, 8.5), (24.660900369, 11), (30.339099631, 11), (32.436848709, 8.5), align=None)
    extrude(amount=-CUT_EXTRUDE17_DEPTH, mode=Mode.SUBTRACT)

    # Sketch62 → Cut-Extrude18 (cut)
    with BuildSketch(Plane.XY.offset(30)):
        with Locations((27.5, 18.5)):
            Rectangle(SKETCH62_W, SKETCH62_H)
    extrude(amount=-CUT_EXTRUDE18_DEPTH, mode=Mode.SUBTRACT)

    # Sketch63 → Cut-Extrude20 (cut)
    with BuildSketch(Plane(origin=(0, 0, -41), x_dir=(-1, 0, 0), z_dir=(0, 0, -1))):
        with Locations((-10, 26)):
            Rectangle(SKETCH63_W, SKETCH63_H)
    extrude(amount=-CUT_EXTRUDE20_DEPTH, mode=Mode.SUBTRACT)

    # Sketch64 → Boss-Extrude38 (add)
    with BuildSketch(Plane(origin=(0, 0, -17.5), x_dir=(-1, 0, 0), z_dir=(0, 0, -1))):
        with Locations((-17, 27.25)):
            Rectangle(SKETCH64_W, SKETCH64_H)
    extrude(amount=BOSS_EXTRUDE38_DEPTH)

    # Sketch65 → Cut-Extrude22 (cut)
    with BuildSketch(Plane(origin=(0, 8, 0), x_dir=(1, 0, 0), z_dir=(0, 1, 0))):
        Polygon((-11, 27.5), (-11, 0), (0, 0), (0, 7.5), (0, 27.5), align=None)
        with BuildLine():
            ThreePointArc((5, 7.5), (5.732233047, 5.732233047), (7.5, 5))
            Line((7.5, 5), (7.5, 7.5))
            Line((7.5, 7.5), (5, 7.5))
        make_face()
        with BuildLine():
            Line((7.5, 7.5), (7.5, 5))
            ThreePointArc((7.5, 5), (9.267766953, 5.732233047), (10, 7.5))
            ThreePointArc((10, 7.5), (7.5, 10), (5, 7.5))
            Line((5, 7.5), (7.5, 7.5))
        make_face()
    extrude(amount=-CUT_EXTRUDE22_DEPTH, mode=Mode.SUBTRACT)

    # Fillet6
    fillet6_edges = [part_2.edges().sort_by_distance(p)[0] for p in [
        (0, 3.5, 0),
    ]]
    fillet(fillet6_edges, radius=FILLET6_R)

    # Sketch67 → Boss-Extrude39 (add, two sides: drawn at the far end of the back side and taken through both)
    with BuildSketch(Plane(origin=(55, 0, 0), x_dir=(0, 0, -1), z_dir=(1, 0, 0)).offset(-BOSS_EXTRUDE39_DEPTH_BACK)):
        with Locations((13.75, 3.5)):
            Rectangle(SKETCH67_W, SKETCH67_H)
    extrude(amount=BOSS_EXTRUDE39_DEPTH + BOSS_EXTRUDE39_DEPTH_BACK)

    # Sketch68 → Cut-Extrude23 (cut)
    with BuildSketch(Plane(origin=(0, 0, -41), x_dir=(-1, 0, 0), z_dir=(0, 0, -1))):
        with Locations((-2.5, 46.5)):
            Rectangle(SKETCH68_W, SKETCH68_H)
    extrude(amount=-CUT_EXTRUDE23_DEPTH, mode=Mode.SUBTRACT)

    # Sketch69 → Cut-Extrude24 (cut)
    with BuildSketch(Plane(origin=(0, 0, -24), x_dir=(-1, 0, 0), z_dir=(0, 0, -1))):
        with Locations((-2.5, 48.5)):
            Rectangle(SKETCH69_W, SKETCH69_H)
    extrude(amount=-CUT_EXTRUDE24_DEPTH, mode=Mode.SUBTRACT)

    # Sketch70 → Cut-Extrude25 (cut)
    with BuildSketch(Plane(origin=(0, 0, -24), x_dir=(-1, 0, 0), z_dir=(0, 0, -1))):
        Polygon((-17.5, 28), (-17.5, 26.5), (-7.5, 26.5), (-1.5, 26.5), (-1.5, 28), align=None)
        with Locations((-4.5, 25.25)):
            Rectangle(SKETCH70_W, SKETCH70_H)
    extrude(amount=-CUT_EXTRUDE25_DEPTH, mode=Mode.SUBTRACT)

    # Sketch71 → Boss-Extrude40 (add)
    with BuildSketch(Plane(origin=(0, 26.5, 0), x_dir=(1, 0, 0), z_dir=(0, 1, 0))):
        with Locations((27.5, 20.75)):
            Rectangle(SKETCH71_W, SKETCH71_H)
    extrude(amount=BOSS_EXTRUDE40_DEPTH)


solid = part_2.part
